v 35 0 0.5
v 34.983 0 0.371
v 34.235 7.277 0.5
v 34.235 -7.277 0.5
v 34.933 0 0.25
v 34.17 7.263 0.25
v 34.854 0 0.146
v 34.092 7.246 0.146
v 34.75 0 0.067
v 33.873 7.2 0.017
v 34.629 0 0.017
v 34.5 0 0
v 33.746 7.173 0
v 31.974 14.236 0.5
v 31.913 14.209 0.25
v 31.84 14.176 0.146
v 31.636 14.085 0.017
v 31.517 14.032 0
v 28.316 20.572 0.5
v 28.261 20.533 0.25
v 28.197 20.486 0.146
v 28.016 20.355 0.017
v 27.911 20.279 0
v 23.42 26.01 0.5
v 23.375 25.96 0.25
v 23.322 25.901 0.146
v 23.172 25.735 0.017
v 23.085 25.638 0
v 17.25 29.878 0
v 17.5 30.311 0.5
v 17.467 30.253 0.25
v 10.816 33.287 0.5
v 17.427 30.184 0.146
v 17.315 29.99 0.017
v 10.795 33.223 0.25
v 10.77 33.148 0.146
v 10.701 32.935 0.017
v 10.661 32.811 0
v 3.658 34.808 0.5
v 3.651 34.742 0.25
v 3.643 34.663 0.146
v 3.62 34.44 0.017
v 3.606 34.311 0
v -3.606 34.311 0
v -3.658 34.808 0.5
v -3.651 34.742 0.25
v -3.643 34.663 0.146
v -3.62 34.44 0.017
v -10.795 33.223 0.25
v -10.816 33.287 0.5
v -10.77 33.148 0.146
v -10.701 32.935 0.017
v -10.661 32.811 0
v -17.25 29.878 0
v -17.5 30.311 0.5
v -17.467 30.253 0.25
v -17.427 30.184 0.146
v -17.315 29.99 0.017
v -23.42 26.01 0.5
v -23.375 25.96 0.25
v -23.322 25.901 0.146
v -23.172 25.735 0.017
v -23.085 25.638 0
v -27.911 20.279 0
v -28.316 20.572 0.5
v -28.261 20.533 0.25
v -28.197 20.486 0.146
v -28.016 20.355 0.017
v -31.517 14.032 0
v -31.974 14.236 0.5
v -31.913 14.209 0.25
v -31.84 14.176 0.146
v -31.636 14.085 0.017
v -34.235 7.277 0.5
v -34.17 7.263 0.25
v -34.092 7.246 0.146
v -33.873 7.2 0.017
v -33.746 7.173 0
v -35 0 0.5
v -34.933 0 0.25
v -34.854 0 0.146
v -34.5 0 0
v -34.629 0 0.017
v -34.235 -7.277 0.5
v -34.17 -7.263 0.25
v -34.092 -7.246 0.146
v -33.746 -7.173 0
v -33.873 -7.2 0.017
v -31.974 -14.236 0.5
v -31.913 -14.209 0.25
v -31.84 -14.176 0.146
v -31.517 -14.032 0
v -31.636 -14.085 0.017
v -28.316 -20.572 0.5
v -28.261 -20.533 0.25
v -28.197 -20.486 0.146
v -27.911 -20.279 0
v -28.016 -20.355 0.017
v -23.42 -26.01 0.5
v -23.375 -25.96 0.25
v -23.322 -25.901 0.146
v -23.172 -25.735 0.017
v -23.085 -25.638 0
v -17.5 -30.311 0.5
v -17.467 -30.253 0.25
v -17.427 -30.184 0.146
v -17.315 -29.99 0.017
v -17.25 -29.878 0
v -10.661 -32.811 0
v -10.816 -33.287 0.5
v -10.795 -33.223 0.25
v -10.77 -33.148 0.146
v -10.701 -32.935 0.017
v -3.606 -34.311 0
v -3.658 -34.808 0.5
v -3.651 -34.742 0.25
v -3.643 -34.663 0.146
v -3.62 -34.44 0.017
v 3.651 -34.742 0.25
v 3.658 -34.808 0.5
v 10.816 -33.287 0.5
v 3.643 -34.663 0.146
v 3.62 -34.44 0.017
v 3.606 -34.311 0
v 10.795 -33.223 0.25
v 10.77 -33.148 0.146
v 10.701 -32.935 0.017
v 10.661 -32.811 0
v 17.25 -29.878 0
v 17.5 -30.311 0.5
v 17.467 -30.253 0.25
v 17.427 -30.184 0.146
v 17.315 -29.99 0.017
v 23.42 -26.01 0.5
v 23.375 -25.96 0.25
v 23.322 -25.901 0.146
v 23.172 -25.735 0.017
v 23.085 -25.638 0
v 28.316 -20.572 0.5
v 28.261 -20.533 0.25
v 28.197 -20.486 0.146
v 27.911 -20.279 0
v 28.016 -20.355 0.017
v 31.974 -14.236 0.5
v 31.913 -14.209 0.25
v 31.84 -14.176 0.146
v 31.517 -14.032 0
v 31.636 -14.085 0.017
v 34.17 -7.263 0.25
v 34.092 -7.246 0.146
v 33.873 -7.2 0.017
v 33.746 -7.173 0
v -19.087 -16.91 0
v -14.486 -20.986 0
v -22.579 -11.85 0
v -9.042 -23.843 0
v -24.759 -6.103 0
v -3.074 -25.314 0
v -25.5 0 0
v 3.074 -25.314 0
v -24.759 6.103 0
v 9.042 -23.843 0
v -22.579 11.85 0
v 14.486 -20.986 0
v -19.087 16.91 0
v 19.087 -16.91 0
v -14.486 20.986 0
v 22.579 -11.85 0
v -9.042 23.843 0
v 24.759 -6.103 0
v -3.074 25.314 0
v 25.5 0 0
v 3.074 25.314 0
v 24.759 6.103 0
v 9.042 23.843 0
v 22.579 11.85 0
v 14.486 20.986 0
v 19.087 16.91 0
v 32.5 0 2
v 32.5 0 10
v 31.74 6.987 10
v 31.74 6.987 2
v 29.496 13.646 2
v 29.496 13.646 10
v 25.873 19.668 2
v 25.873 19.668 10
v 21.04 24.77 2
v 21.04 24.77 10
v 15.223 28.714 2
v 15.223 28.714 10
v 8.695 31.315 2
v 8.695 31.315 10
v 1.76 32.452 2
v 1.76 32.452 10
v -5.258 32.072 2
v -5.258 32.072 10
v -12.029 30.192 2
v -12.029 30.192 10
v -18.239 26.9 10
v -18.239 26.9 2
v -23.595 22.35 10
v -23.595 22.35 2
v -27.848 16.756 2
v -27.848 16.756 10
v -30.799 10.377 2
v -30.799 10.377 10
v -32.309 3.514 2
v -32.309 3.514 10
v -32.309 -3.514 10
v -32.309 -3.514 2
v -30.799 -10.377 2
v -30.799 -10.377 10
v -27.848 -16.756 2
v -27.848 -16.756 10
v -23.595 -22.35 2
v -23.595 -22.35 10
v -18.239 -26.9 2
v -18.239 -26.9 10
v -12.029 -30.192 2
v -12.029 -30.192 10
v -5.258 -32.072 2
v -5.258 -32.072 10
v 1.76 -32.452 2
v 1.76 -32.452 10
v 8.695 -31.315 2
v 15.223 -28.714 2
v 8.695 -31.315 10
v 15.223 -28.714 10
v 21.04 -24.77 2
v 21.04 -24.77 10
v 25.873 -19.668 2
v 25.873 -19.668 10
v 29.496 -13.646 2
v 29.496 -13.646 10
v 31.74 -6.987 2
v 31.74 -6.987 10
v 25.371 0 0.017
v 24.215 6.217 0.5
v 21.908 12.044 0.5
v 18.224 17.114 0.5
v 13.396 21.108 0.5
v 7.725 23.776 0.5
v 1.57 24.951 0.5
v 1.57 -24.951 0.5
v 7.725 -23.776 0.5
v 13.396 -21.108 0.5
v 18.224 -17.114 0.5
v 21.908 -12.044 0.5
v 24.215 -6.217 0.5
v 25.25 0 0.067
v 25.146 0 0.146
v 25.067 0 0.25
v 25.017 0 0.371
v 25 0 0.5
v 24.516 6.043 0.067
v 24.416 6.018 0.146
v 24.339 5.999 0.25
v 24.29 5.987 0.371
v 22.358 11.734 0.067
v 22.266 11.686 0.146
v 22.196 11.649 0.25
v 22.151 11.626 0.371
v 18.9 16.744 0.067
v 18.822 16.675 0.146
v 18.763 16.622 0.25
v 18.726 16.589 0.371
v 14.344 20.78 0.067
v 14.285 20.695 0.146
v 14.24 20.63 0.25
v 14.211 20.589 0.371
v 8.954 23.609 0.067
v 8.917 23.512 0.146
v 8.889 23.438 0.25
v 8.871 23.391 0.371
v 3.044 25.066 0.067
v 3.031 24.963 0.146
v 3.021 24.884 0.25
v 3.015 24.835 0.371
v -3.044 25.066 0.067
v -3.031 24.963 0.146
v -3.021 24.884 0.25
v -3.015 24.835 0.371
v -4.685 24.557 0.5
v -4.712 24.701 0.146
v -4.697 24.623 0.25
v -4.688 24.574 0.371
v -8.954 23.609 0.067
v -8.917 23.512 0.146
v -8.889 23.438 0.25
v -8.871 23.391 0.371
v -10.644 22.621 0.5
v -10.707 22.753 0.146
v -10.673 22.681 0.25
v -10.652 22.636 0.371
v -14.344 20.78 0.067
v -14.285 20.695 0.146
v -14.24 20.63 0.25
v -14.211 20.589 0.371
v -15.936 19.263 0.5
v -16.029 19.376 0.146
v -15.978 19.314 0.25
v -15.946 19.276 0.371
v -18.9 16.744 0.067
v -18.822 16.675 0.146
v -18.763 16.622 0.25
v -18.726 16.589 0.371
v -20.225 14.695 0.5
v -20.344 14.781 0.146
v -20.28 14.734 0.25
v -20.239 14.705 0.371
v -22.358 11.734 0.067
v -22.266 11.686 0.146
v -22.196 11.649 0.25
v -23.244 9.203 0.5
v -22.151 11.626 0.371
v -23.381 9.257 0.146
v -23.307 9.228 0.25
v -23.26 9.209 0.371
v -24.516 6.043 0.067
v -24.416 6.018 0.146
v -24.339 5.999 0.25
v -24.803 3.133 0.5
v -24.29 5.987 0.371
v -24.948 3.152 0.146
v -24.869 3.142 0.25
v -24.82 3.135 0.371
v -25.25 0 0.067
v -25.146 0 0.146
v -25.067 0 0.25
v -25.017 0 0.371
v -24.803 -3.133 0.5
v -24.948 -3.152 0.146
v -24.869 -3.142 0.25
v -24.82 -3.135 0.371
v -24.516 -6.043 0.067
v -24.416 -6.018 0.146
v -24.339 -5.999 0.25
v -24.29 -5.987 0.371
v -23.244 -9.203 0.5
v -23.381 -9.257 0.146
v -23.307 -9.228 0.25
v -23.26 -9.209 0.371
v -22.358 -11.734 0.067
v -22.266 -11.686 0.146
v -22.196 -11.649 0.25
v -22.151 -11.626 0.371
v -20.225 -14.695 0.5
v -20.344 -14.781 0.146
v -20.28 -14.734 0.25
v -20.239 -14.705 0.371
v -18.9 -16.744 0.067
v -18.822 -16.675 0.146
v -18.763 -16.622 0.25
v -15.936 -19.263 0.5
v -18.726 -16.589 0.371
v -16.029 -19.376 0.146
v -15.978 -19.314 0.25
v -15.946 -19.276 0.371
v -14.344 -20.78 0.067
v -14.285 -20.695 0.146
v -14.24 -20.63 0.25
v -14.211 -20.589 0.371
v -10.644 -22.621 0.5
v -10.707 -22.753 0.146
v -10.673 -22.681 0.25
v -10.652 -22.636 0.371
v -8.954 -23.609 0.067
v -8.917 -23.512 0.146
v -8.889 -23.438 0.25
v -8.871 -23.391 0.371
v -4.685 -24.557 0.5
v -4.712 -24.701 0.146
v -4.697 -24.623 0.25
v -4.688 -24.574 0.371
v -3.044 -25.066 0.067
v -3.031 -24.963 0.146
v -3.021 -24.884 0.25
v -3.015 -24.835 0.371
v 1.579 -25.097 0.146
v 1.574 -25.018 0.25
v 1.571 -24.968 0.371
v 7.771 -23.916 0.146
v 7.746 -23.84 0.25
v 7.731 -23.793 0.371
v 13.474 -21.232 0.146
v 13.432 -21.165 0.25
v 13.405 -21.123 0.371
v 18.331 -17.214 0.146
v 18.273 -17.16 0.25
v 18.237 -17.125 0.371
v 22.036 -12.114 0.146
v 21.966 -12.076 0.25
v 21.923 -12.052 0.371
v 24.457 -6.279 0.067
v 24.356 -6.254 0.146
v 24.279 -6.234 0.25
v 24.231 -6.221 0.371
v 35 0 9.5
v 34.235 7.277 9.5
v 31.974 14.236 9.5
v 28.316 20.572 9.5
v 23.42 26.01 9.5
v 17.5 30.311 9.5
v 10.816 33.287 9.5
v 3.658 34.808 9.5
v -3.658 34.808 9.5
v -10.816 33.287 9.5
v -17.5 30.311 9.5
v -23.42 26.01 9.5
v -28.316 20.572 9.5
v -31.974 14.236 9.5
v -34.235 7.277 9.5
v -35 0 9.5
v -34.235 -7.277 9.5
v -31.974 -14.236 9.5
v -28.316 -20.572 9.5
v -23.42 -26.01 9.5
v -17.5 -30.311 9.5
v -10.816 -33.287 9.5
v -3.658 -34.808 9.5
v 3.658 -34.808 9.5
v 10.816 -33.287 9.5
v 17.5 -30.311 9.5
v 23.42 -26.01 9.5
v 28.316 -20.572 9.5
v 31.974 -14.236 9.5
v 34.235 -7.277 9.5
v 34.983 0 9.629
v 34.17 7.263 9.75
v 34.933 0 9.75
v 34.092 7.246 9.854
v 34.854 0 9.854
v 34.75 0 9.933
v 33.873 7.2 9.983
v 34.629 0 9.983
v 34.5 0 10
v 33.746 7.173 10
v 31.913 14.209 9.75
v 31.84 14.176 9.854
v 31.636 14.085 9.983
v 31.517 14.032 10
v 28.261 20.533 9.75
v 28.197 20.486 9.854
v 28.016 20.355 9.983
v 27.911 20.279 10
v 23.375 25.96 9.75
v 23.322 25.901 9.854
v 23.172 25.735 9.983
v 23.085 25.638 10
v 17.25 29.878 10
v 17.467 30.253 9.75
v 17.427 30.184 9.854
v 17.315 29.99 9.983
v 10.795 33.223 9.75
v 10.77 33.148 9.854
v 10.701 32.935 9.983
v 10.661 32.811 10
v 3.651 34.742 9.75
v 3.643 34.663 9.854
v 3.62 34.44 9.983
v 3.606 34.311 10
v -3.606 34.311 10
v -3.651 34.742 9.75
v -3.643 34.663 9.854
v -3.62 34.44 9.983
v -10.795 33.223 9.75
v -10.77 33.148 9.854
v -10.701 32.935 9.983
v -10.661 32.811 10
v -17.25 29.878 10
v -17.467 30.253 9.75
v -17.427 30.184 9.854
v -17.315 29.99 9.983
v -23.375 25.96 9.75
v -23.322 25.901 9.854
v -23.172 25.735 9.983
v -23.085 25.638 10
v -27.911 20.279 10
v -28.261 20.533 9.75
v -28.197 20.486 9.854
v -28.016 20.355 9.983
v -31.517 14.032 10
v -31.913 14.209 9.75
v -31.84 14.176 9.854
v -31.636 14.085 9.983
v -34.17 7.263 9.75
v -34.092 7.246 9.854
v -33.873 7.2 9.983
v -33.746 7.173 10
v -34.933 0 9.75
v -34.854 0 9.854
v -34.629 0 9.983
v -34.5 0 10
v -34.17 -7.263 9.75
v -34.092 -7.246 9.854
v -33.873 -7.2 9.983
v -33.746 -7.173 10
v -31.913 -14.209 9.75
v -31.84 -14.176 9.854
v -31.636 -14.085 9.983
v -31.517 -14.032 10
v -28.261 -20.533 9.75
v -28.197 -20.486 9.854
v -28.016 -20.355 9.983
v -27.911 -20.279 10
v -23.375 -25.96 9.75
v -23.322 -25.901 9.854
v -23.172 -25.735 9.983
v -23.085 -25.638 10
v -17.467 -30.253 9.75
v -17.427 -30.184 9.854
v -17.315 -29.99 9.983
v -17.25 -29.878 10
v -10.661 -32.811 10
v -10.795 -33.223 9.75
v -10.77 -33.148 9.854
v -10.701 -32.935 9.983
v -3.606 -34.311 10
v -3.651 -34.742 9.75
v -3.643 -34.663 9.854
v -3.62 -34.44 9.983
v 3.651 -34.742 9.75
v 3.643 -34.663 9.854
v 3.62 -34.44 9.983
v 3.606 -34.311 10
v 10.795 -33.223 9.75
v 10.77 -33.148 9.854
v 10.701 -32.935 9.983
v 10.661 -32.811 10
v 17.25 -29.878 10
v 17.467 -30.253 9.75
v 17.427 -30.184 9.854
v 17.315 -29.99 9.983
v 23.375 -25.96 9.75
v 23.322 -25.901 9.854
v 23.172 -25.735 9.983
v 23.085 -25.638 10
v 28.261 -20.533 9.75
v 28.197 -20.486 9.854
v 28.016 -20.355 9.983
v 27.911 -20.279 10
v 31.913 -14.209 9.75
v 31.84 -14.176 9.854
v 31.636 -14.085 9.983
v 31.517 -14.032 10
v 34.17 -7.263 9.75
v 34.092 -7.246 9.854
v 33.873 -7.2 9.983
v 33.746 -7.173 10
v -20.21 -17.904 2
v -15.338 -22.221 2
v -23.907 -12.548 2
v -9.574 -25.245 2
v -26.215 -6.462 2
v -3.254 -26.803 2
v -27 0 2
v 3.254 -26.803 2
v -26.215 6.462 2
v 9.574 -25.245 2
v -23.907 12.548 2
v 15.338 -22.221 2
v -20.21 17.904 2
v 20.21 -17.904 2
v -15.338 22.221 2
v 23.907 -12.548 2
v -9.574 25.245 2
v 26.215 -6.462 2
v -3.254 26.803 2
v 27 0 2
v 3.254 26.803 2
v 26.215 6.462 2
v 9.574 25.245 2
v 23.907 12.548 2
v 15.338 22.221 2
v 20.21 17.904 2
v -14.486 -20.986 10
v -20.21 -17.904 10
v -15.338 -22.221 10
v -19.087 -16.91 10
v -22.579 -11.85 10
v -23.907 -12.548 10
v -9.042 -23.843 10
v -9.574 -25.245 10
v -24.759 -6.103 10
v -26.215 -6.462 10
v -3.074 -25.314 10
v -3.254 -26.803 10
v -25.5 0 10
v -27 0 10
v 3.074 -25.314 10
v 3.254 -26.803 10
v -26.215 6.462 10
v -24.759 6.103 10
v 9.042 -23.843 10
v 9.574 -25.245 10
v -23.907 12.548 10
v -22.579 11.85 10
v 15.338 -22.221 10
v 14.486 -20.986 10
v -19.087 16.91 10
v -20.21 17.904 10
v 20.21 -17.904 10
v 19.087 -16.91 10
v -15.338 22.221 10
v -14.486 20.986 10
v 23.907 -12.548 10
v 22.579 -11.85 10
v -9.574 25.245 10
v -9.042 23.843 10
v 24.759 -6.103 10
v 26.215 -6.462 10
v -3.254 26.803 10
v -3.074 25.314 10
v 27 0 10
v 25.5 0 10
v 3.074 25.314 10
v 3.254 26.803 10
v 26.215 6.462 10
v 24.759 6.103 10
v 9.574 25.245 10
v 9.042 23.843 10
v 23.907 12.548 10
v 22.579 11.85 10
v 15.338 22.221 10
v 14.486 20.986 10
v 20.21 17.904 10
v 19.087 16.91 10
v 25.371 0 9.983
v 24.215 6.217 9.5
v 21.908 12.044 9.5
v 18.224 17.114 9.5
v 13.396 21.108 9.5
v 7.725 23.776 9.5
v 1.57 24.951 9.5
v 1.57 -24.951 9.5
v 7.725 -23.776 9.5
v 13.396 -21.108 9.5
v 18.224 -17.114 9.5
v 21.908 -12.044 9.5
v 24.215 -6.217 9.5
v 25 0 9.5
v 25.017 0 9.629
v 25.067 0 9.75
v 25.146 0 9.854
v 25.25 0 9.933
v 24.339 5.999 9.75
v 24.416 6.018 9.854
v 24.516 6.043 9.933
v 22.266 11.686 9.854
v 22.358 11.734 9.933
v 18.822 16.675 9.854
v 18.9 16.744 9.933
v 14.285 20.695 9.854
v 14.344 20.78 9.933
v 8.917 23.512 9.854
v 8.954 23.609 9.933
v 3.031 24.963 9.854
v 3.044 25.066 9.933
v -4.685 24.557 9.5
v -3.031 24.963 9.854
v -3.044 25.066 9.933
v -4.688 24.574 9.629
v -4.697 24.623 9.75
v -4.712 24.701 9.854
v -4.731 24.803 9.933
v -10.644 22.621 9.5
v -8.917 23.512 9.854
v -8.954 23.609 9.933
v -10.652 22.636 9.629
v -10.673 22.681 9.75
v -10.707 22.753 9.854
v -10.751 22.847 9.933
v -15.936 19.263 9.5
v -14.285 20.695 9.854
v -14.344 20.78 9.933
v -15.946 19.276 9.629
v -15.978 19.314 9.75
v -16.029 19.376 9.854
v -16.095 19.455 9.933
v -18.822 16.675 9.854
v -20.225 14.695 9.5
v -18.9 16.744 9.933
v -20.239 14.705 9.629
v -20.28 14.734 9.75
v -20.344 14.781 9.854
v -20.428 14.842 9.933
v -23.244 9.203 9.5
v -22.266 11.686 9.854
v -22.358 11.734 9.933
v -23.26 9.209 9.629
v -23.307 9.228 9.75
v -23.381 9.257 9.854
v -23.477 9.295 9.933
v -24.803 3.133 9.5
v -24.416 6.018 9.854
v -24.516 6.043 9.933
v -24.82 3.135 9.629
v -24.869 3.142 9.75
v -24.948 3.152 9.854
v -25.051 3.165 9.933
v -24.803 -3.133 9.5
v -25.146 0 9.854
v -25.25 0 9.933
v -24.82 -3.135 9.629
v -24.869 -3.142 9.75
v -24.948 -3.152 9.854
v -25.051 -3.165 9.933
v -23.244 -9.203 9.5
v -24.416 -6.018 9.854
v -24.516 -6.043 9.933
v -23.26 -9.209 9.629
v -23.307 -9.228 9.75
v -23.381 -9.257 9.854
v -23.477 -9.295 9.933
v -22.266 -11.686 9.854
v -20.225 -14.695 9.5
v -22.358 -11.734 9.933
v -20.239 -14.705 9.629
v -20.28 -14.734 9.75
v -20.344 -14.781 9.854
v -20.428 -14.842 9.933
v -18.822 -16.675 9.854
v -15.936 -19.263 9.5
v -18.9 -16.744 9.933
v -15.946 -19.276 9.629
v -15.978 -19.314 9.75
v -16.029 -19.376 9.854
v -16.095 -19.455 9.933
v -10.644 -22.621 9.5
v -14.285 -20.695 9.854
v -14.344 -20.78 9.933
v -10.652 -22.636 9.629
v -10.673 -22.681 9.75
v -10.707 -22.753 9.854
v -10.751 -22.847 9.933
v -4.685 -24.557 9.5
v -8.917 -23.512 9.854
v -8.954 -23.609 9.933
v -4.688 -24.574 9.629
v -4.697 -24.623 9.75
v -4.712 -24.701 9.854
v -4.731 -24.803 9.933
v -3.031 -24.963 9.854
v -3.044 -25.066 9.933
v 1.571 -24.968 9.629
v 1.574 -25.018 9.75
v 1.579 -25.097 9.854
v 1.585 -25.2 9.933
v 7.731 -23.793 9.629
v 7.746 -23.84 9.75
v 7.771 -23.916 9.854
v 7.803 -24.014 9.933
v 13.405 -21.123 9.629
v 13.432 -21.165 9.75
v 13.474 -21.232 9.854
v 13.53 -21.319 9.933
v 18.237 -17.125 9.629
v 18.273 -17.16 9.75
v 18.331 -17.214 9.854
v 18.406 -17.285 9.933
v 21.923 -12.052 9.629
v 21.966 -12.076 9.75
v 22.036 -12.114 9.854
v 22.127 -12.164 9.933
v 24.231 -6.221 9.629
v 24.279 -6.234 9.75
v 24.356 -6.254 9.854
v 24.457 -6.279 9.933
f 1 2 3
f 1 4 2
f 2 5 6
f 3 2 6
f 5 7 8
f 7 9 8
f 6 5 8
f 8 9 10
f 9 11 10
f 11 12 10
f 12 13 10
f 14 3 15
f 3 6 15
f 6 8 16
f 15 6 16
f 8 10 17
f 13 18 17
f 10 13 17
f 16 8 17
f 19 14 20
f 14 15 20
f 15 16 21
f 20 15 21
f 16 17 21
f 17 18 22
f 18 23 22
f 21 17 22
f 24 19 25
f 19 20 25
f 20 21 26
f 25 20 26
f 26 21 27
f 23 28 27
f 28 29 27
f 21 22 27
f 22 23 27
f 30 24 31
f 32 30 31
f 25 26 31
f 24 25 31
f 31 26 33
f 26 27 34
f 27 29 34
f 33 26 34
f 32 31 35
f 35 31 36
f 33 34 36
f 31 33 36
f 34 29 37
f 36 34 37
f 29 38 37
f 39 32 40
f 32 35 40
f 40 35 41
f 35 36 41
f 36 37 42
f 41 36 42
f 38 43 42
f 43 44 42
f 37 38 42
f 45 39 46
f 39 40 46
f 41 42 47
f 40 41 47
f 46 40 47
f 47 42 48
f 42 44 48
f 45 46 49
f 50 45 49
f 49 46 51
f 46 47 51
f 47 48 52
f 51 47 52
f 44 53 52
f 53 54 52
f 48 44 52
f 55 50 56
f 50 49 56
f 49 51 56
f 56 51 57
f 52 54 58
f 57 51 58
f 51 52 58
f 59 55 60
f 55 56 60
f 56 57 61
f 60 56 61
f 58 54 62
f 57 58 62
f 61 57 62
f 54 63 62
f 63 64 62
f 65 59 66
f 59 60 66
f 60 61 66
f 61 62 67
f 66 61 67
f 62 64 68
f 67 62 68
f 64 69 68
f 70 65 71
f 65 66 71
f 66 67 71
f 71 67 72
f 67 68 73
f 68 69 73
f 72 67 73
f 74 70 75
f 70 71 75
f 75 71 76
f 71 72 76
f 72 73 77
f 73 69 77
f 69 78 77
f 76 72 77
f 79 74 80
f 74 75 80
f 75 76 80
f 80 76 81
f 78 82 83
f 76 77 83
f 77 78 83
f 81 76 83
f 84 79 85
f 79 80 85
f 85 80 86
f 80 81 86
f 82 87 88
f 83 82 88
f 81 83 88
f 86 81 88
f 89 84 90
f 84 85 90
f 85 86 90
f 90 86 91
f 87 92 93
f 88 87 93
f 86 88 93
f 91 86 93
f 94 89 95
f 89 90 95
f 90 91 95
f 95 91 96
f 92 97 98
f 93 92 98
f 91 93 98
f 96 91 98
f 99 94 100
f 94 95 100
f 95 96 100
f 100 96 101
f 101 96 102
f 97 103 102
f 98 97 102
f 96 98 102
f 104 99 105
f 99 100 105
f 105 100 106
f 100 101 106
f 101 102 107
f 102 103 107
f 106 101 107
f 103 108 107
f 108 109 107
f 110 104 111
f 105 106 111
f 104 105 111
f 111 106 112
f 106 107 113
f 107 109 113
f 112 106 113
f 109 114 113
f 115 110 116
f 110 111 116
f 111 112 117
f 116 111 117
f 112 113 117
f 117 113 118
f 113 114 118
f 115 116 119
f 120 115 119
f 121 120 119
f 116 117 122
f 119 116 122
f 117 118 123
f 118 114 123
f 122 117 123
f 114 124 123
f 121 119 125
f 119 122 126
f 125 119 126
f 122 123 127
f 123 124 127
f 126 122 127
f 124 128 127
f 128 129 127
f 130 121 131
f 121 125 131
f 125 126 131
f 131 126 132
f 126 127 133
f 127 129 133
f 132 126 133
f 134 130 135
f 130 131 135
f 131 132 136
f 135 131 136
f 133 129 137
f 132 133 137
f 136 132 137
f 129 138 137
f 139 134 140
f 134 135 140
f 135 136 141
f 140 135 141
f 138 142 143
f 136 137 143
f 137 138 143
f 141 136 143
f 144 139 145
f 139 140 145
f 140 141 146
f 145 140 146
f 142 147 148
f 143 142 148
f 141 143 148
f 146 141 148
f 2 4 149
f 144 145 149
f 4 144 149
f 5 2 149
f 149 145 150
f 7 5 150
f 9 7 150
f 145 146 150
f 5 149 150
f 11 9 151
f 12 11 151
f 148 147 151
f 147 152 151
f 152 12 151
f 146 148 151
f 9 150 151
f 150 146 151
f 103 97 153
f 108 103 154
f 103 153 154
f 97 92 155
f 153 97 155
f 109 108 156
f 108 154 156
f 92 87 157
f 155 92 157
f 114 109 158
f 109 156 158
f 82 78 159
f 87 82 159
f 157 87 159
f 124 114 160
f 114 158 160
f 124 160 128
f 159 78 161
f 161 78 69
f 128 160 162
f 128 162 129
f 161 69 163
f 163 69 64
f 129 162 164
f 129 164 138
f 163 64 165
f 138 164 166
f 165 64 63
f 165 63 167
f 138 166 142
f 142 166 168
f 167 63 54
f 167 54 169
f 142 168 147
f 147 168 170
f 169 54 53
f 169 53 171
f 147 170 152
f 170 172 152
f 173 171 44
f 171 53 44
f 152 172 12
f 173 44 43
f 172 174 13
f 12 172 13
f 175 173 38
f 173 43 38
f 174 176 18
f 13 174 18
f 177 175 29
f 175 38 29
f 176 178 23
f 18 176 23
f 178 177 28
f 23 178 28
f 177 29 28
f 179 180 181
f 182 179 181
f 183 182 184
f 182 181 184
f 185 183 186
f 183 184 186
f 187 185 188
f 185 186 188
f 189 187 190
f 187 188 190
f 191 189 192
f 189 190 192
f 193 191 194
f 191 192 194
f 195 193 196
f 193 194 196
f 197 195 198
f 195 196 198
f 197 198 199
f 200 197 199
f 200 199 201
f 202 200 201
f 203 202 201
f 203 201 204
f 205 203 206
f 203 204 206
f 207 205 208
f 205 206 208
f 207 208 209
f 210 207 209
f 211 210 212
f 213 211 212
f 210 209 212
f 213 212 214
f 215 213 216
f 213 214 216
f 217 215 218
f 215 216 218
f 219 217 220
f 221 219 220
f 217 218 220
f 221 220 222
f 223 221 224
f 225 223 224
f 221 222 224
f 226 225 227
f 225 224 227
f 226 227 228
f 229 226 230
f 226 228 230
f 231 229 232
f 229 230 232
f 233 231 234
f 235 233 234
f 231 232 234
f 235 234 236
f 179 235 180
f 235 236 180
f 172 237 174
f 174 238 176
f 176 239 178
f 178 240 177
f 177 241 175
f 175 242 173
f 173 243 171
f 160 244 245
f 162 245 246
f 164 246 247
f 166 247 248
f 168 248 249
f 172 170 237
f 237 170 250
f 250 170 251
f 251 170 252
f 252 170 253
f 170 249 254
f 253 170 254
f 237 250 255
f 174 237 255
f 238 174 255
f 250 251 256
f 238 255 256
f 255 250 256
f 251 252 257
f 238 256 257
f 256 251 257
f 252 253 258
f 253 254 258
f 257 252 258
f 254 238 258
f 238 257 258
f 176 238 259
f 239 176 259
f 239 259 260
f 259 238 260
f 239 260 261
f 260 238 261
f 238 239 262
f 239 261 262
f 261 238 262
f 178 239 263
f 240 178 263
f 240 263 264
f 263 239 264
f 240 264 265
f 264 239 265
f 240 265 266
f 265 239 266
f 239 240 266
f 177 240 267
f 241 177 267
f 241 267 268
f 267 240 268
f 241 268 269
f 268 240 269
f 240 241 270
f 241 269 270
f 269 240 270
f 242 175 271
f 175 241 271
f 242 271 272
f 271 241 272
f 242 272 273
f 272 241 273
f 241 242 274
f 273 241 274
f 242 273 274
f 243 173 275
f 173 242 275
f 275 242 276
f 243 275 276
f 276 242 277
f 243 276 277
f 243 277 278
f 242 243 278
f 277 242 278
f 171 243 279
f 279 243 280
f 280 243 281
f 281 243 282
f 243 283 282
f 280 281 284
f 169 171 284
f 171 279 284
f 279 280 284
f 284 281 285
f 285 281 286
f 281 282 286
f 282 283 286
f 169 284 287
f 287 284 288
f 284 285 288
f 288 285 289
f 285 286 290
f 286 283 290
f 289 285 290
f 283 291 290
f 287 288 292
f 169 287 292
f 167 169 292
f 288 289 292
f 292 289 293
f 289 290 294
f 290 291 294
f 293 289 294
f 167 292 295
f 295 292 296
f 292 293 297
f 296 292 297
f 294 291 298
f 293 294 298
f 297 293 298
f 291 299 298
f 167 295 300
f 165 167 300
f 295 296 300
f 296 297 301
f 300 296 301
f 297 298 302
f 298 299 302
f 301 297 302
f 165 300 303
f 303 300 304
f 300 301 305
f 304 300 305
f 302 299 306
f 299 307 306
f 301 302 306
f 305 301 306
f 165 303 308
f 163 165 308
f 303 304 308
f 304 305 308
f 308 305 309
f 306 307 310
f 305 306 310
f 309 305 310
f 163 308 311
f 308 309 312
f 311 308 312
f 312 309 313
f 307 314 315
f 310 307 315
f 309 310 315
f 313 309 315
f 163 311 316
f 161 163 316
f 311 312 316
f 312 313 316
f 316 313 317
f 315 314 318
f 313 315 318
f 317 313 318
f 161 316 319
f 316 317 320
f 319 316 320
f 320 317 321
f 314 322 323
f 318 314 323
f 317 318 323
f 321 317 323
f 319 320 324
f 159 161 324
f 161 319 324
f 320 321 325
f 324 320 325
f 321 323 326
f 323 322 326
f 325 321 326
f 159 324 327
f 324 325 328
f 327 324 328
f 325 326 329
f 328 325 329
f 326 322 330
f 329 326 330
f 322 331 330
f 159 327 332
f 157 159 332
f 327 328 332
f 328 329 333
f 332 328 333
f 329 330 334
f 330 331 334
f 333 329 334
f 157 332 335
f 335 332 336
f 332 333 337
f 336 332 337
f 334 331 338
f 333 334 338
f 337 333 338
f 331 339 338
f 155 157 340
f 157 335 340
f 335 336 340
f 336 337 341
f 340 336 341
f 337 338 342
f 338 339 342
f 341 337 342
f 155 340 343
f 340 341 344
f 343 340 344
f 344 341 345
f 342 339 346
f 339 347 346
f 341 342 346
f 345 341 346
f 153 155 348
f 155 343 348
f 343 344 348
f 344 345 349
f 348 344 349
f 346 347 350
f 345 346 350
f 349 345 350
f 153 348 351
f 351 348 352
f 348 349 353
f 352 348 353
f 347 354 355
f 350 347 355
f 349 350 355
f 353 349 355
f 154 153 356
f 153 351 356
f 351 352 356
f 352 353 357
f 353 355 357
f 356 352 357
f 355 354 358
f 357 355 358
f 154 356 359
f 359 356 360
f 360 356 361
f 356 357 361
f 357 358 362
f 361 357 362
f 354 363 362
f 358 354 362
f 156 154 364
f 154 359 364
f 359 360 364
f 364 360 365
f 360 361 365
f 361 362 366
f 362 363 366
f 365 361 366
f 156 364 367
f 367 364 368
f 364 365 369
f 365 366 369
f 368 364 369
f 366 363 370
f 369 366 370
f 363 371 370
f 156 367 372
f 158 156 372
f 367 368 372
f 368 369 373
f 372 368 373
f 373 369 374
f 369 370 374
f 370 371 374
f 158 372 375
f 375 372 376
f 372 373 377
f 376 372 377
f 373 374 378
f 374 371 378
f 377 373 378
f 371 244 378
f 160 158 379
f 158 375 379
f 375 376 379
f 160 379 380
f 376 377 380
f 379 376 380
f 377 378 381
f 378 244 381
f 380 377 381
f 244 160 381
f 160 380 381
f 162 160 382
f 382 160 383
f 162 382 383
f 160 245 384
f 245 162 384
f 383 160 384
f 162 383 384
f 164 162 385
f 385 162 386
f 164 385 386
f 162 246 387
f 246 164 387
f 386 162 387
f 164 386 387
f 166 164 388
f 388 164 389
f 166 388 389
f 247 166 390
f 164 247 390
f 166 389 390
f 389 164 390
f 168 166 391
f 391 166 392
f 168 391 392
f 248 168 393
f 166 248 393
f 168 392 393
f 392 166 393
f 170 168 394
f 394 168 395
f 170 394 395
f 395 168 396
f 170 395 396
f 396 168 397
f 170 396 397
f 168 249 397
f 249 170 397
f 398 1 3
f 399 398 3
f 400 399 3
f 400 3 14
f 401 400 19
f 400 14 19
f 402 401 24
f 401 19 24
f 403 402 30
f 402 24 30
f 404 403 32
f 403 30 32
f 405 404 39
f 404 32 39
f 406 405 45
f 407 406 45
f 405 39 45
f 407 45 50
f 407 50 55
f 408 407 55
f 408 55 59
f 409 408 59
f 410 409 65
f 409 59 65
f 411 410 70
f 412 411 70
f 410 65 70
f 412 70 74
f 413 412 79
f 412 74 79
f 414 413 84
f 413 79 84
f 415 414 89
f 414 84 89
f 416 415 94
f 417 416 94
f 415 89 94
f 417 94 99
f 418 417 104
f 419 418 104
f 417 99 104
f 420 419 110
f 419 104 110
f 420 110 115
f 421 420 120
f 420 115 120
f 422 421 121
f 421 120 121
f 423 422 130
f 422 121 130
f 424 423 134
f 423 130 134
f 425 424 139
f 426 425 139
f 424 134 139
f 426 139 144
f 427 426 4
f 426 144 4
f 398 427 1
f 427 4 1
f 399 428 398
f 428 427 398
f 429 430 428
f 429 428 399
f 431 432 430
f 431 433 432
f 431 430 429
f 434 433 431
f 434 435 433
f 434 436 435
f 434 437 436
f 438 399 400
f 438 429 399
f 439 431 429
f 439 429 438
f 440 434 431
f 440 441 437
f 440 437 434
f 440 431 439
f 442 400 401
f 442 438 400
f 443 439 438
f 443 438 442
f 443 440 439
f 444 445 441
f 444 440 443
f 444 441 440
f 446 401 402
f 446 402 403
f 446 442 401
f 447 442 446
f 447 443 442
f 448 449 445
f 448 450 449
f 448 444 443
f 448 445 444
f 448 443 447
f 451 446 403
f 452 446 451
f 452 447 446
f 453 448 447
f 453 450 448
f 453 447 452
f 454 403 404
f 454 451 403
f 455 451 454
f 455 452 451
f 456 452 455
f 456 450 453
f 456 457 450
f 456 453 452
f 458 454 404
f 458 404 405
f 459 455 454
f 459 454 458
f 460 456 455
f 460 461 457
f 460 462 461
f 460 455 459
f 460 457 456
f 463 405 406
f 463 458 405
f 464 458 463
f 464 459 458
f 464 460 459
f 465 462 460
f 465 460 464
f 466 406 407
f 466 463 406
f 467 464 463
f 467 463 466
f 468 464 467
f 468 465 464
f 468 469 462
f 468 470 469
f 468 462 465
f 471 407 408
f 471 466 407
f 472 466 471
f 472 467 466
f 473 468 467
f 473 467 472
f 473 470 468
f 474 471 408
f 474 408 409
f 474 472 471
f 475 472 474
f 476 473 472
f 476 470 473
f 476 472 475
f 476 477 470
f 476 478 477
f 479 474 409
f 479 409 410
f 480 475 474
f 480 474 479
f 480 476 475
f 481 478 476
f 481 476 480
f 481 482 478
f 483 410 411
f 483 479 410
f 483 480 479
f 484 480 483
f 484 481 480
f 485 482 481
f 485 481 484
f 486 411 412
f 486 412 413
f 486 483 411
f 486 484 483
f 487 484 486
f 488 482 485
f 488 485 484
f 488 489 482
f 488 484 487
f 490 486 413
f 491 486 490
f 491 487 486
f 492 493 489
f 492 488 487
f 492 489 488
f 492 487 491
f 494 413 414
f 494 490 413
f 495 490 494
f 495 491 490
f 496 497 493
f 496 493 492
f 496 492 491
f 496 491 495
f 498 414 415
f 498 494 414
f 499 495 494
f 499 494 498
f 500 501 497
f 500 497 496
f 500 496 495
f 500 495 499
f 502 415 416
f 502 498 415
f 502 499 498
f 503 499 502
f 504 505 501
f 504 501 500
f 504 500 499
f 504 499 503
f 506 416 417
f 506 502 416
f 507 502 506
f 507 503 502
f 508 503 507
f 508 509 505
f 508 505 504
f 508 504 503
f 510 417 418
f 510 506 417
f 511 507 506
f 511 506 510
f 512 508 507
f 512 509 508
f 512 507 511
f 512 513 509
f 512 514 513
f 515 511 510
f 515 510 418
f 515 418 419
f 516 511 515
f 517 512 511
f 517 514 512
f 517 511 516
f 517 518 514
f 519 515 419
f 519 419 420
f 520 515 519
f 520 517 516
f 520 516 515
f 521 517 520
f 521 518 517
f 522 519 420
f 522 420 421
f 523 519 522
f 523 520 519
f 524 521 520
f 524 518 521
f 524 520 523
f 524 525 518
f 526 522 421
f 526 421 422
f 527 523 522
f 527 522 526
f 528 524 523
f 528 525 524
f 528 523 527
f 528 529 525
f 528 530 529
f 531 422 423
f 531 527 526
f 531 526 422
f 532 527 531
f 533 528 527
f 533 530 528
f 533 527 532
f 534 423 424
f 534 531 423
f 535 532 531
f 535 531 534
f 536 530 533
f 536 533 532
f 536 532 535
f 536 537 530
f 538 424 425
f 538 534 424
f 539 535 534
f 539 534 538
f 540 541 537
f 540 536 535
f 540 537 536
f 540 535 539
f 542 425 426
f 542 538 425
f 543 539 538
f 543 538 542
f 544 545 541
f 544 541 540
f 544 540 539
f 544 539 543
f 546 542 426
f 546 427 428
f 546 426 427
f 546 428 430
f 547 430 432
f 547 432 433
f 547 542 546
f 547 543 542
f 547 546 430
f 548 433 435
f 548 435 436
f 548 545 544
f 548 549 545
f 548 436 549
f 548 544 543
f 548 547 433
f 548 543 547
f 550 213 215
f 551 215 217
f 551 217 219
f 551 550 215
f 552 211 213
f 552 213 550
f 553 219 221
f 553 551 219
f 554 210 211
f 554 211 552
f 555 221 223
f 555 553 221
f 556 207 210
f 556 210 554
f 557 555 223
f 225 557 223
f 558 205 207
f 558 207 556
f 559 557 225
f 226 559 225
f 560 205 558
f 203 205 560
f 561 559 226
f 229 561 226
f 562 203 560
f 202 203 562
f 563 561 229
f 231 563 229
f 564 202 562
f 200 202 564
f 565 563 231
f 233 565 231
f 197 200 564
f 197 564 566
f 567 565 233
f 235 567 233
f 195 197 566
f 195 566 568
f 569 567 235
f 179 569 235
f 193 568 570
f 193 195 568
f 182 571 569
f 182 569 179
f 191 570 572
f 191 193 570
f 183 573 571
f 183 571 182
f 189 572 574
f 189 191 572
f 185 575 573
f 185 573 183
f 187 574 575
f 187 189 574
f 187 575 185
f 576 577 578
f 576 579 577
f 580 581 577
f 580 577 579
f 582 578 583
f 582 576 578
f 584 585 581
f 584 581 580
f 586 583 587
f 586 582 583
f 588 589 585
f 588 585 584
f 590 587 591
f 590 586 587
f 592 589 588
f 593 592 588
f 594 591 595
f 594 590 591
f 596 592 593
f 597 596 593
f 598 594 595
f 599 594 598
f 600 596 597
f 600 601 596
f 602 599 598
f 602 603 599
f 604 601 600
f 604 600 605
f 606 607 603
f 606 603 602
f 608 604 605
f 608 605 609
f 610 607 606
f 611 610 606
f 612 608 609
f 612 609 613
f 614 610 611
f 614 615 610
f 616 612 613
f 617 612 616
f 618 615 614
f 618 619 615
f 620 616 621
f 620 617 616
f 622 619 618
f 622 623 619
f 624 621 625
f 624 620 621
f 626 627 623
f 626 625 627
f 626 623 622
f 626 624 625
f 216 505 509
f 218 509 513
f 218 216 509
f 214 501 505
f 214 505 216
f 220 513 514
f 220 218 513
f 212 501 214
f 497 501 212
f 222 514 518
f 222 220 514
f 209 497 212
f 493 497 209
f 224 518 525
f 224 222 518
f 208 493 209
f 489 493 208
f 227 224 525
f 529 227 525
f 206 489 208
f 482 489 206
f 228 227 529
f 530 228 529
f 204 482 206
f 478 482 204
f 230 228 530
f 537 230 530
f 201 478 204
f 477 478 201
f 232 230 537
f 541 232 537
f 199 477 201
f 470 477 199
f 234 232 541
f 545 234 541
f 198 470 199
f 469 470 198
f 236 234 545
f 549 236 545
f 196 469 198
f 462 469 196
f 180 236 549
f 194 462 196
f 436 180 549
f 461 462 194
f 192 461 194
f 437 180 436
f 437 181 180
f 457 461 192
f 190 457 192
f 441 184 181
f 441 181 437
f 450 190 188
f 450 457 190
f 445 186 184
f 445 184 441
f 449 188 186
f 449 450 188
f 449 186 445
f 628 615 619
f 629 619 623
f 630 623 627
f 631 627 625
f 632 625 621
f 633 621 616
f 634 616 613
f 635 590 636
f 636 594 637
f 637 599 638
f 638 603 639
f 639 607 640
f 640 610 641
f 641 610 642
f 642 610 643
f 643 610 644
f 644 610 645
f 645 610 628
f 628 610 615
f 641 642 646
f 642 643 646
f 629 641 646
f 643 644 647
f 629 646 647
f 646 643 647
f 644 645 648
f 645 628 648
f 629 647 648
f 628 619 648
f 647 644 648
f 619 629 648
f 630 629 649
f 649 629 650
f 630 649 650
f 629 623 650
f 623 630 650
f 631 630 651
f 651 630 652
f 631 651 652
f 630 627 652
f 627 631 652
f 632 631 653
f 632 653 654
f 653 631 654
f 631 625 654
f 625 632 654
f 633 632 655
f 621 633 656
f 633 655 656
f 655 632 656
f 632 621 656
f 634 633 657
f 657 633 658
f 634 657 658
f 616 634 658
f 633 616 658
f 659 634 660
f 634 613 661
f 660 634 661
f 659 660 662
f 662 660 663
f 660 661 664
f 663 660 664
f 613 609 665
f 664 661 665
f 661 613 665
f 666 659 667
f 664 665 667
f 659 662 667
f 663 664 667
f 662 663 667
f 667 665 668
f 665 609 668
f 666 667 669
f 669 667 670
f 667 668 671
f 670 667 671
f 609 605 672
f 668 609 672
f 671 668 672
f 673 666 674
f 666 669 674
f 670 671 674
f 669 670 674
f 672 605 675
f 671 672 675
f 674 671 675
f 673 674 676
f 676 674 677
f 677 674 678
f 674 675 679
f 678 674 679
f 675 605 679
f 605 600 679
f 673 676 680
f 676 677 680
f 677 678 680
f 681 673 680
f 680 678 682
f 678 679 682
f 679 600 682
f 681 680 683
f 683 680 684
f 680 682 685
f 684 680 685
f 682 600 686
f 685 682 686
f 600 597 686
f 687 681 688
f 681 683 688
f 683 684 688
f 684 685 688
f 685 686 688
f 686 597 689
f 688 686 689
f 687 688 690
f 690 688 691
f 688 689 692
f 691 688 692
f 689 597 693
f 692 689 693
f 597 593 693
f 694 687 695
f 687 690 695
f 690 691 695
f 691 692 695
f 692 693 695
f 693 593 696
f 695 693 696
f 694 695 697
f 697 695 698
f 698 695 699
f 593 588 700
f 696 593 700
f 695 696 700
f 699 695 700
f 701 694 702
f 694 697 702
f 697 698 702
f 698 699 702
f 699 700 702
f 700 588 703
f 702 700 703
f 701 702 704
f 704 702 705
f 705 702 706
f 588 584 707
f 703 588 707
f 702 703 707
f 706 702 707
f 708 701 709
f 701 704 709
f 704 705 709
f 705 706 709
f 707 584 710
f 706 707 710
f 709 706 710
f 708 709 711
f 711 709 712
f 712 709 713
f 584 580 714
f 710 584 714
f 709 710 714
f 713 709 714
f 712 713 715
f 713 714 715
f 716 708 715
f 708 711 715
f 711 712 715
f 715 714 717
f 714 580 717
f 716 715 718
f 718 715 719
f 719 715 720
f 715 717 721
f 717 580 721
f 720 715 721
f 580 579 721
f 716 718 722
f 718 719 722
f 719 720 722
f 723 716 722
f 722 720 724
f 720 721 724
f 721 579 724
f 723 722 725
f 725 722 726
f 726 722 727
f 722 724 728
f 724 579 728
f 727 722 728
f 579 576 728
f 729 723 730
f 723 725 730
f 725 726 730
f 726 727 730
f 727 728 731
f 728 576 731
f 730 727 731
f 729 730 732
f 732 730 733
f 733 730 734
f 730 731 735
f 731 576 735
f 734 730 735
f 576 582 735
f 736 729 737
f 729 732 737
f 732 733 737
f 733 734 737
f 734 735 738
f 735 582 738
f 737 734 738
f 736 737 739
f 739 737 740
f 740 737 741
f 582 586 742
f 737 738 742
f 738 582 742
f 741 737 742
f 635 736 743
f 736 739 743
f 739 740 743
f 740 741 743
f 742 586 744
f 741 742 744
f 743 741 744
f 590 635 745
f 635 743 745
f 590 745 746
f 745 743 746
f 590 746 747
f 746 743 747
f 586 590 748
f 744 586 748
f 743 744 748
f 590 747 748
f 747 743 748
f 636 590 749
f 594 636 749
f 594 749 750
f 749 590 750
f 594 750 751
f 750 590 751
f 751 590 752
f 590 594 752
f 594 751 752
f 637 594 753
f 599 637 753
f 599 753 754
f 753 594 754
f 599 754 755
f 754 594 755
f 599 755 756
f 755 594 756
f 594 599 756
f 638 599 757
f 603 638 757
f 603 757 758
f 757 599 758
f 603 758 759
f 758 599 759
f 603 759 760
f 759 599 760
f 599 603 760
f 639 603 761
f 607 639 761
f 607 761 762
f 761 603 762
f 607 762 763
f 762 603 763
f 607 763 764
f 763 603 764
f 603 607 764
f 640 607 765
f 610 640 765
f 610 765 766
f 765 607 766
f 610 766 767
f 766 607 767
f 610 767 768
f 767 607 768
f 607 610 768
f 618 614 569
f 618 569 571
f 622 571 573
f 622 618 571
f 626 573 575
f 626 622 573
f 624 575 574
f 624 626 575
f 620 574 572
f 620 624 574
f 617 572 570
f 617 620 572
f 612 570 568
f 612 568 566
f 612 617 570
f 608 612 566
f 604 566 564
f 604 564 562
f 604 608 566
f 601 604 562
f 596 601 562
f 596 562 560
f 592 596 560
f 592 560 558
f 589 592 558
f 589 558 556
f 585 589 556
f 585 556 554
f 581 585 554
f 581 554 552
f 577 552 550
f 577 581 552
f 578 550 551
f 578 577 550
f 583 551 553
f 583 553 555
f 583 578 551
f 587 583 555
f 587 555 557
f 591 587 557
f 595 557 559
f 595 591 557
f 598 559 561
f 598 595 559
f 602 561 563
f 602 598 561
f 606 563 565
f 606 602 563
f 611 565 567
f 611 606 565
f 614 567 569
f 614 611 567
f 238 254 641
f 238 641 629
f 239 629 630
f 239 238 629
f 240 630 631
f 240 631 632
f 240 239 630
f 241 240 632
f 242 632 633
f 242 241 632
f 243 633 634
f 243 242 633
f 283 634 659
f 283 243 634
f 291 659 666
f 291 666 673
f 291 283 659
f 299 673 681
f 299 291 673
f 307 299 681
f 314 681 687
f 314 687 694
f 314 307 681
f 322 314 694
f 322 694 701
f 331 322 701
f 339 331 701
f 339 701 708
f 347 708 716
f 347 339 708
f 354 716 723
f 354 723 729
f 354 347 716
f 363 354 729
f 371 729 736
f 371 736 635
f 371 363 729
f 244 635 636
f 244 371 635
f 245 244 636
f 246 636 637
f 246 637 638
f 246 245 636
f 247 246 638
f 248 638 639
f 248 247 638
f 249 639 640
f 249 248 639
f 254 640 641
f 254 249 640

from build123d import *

# Parameters (mm, degrees)
SKETCH1_R           = 35
SKETCH1_R_2         = 25
BOSS_EXTRUDE1_DEPTH = 10
SKETCH2_R           = 32.5
SKETCH2_R_2         = 27
CUT_EXTRUDE1_DEPTH  = 8
FILLET1_R           = 0.5


with BuildPart() as part:
    # Sketch1 → Boss-Extrude1 (new body)
    with BuildSketch(Plane.XY):
        Circle(SKETCH1_R)
        Circle(SKETCH1_R_2, mode=Mode.SUBTRACT)
    extrude(amount=BOSS_EXTRUDE1_DEPTH)

    # Sketch2 → Cut-Extrude1 (cut)
    with BuildSketch(Plane.XY.offset(10)):
        Circle(SKETCH2_R)
        Circle(SKETCH2_R_2, mode=Mode.SUBTRACT)
    extrude(amount=-CUT_EXTRUDE1_DEPTH, mode=Mode.SUBTRACT)

    # Fillet1
    fillet1_edges = [part.edges().sort_by_distance(p)[0] for p in [
        (-35, 0, 0),
        (-35, 0, 10),
        (-25, 0, 0),
        (-25, 0, 10),
    ]]
    fillet(fillet1_edges, radius=FILLET1_R)


solid = part.part
